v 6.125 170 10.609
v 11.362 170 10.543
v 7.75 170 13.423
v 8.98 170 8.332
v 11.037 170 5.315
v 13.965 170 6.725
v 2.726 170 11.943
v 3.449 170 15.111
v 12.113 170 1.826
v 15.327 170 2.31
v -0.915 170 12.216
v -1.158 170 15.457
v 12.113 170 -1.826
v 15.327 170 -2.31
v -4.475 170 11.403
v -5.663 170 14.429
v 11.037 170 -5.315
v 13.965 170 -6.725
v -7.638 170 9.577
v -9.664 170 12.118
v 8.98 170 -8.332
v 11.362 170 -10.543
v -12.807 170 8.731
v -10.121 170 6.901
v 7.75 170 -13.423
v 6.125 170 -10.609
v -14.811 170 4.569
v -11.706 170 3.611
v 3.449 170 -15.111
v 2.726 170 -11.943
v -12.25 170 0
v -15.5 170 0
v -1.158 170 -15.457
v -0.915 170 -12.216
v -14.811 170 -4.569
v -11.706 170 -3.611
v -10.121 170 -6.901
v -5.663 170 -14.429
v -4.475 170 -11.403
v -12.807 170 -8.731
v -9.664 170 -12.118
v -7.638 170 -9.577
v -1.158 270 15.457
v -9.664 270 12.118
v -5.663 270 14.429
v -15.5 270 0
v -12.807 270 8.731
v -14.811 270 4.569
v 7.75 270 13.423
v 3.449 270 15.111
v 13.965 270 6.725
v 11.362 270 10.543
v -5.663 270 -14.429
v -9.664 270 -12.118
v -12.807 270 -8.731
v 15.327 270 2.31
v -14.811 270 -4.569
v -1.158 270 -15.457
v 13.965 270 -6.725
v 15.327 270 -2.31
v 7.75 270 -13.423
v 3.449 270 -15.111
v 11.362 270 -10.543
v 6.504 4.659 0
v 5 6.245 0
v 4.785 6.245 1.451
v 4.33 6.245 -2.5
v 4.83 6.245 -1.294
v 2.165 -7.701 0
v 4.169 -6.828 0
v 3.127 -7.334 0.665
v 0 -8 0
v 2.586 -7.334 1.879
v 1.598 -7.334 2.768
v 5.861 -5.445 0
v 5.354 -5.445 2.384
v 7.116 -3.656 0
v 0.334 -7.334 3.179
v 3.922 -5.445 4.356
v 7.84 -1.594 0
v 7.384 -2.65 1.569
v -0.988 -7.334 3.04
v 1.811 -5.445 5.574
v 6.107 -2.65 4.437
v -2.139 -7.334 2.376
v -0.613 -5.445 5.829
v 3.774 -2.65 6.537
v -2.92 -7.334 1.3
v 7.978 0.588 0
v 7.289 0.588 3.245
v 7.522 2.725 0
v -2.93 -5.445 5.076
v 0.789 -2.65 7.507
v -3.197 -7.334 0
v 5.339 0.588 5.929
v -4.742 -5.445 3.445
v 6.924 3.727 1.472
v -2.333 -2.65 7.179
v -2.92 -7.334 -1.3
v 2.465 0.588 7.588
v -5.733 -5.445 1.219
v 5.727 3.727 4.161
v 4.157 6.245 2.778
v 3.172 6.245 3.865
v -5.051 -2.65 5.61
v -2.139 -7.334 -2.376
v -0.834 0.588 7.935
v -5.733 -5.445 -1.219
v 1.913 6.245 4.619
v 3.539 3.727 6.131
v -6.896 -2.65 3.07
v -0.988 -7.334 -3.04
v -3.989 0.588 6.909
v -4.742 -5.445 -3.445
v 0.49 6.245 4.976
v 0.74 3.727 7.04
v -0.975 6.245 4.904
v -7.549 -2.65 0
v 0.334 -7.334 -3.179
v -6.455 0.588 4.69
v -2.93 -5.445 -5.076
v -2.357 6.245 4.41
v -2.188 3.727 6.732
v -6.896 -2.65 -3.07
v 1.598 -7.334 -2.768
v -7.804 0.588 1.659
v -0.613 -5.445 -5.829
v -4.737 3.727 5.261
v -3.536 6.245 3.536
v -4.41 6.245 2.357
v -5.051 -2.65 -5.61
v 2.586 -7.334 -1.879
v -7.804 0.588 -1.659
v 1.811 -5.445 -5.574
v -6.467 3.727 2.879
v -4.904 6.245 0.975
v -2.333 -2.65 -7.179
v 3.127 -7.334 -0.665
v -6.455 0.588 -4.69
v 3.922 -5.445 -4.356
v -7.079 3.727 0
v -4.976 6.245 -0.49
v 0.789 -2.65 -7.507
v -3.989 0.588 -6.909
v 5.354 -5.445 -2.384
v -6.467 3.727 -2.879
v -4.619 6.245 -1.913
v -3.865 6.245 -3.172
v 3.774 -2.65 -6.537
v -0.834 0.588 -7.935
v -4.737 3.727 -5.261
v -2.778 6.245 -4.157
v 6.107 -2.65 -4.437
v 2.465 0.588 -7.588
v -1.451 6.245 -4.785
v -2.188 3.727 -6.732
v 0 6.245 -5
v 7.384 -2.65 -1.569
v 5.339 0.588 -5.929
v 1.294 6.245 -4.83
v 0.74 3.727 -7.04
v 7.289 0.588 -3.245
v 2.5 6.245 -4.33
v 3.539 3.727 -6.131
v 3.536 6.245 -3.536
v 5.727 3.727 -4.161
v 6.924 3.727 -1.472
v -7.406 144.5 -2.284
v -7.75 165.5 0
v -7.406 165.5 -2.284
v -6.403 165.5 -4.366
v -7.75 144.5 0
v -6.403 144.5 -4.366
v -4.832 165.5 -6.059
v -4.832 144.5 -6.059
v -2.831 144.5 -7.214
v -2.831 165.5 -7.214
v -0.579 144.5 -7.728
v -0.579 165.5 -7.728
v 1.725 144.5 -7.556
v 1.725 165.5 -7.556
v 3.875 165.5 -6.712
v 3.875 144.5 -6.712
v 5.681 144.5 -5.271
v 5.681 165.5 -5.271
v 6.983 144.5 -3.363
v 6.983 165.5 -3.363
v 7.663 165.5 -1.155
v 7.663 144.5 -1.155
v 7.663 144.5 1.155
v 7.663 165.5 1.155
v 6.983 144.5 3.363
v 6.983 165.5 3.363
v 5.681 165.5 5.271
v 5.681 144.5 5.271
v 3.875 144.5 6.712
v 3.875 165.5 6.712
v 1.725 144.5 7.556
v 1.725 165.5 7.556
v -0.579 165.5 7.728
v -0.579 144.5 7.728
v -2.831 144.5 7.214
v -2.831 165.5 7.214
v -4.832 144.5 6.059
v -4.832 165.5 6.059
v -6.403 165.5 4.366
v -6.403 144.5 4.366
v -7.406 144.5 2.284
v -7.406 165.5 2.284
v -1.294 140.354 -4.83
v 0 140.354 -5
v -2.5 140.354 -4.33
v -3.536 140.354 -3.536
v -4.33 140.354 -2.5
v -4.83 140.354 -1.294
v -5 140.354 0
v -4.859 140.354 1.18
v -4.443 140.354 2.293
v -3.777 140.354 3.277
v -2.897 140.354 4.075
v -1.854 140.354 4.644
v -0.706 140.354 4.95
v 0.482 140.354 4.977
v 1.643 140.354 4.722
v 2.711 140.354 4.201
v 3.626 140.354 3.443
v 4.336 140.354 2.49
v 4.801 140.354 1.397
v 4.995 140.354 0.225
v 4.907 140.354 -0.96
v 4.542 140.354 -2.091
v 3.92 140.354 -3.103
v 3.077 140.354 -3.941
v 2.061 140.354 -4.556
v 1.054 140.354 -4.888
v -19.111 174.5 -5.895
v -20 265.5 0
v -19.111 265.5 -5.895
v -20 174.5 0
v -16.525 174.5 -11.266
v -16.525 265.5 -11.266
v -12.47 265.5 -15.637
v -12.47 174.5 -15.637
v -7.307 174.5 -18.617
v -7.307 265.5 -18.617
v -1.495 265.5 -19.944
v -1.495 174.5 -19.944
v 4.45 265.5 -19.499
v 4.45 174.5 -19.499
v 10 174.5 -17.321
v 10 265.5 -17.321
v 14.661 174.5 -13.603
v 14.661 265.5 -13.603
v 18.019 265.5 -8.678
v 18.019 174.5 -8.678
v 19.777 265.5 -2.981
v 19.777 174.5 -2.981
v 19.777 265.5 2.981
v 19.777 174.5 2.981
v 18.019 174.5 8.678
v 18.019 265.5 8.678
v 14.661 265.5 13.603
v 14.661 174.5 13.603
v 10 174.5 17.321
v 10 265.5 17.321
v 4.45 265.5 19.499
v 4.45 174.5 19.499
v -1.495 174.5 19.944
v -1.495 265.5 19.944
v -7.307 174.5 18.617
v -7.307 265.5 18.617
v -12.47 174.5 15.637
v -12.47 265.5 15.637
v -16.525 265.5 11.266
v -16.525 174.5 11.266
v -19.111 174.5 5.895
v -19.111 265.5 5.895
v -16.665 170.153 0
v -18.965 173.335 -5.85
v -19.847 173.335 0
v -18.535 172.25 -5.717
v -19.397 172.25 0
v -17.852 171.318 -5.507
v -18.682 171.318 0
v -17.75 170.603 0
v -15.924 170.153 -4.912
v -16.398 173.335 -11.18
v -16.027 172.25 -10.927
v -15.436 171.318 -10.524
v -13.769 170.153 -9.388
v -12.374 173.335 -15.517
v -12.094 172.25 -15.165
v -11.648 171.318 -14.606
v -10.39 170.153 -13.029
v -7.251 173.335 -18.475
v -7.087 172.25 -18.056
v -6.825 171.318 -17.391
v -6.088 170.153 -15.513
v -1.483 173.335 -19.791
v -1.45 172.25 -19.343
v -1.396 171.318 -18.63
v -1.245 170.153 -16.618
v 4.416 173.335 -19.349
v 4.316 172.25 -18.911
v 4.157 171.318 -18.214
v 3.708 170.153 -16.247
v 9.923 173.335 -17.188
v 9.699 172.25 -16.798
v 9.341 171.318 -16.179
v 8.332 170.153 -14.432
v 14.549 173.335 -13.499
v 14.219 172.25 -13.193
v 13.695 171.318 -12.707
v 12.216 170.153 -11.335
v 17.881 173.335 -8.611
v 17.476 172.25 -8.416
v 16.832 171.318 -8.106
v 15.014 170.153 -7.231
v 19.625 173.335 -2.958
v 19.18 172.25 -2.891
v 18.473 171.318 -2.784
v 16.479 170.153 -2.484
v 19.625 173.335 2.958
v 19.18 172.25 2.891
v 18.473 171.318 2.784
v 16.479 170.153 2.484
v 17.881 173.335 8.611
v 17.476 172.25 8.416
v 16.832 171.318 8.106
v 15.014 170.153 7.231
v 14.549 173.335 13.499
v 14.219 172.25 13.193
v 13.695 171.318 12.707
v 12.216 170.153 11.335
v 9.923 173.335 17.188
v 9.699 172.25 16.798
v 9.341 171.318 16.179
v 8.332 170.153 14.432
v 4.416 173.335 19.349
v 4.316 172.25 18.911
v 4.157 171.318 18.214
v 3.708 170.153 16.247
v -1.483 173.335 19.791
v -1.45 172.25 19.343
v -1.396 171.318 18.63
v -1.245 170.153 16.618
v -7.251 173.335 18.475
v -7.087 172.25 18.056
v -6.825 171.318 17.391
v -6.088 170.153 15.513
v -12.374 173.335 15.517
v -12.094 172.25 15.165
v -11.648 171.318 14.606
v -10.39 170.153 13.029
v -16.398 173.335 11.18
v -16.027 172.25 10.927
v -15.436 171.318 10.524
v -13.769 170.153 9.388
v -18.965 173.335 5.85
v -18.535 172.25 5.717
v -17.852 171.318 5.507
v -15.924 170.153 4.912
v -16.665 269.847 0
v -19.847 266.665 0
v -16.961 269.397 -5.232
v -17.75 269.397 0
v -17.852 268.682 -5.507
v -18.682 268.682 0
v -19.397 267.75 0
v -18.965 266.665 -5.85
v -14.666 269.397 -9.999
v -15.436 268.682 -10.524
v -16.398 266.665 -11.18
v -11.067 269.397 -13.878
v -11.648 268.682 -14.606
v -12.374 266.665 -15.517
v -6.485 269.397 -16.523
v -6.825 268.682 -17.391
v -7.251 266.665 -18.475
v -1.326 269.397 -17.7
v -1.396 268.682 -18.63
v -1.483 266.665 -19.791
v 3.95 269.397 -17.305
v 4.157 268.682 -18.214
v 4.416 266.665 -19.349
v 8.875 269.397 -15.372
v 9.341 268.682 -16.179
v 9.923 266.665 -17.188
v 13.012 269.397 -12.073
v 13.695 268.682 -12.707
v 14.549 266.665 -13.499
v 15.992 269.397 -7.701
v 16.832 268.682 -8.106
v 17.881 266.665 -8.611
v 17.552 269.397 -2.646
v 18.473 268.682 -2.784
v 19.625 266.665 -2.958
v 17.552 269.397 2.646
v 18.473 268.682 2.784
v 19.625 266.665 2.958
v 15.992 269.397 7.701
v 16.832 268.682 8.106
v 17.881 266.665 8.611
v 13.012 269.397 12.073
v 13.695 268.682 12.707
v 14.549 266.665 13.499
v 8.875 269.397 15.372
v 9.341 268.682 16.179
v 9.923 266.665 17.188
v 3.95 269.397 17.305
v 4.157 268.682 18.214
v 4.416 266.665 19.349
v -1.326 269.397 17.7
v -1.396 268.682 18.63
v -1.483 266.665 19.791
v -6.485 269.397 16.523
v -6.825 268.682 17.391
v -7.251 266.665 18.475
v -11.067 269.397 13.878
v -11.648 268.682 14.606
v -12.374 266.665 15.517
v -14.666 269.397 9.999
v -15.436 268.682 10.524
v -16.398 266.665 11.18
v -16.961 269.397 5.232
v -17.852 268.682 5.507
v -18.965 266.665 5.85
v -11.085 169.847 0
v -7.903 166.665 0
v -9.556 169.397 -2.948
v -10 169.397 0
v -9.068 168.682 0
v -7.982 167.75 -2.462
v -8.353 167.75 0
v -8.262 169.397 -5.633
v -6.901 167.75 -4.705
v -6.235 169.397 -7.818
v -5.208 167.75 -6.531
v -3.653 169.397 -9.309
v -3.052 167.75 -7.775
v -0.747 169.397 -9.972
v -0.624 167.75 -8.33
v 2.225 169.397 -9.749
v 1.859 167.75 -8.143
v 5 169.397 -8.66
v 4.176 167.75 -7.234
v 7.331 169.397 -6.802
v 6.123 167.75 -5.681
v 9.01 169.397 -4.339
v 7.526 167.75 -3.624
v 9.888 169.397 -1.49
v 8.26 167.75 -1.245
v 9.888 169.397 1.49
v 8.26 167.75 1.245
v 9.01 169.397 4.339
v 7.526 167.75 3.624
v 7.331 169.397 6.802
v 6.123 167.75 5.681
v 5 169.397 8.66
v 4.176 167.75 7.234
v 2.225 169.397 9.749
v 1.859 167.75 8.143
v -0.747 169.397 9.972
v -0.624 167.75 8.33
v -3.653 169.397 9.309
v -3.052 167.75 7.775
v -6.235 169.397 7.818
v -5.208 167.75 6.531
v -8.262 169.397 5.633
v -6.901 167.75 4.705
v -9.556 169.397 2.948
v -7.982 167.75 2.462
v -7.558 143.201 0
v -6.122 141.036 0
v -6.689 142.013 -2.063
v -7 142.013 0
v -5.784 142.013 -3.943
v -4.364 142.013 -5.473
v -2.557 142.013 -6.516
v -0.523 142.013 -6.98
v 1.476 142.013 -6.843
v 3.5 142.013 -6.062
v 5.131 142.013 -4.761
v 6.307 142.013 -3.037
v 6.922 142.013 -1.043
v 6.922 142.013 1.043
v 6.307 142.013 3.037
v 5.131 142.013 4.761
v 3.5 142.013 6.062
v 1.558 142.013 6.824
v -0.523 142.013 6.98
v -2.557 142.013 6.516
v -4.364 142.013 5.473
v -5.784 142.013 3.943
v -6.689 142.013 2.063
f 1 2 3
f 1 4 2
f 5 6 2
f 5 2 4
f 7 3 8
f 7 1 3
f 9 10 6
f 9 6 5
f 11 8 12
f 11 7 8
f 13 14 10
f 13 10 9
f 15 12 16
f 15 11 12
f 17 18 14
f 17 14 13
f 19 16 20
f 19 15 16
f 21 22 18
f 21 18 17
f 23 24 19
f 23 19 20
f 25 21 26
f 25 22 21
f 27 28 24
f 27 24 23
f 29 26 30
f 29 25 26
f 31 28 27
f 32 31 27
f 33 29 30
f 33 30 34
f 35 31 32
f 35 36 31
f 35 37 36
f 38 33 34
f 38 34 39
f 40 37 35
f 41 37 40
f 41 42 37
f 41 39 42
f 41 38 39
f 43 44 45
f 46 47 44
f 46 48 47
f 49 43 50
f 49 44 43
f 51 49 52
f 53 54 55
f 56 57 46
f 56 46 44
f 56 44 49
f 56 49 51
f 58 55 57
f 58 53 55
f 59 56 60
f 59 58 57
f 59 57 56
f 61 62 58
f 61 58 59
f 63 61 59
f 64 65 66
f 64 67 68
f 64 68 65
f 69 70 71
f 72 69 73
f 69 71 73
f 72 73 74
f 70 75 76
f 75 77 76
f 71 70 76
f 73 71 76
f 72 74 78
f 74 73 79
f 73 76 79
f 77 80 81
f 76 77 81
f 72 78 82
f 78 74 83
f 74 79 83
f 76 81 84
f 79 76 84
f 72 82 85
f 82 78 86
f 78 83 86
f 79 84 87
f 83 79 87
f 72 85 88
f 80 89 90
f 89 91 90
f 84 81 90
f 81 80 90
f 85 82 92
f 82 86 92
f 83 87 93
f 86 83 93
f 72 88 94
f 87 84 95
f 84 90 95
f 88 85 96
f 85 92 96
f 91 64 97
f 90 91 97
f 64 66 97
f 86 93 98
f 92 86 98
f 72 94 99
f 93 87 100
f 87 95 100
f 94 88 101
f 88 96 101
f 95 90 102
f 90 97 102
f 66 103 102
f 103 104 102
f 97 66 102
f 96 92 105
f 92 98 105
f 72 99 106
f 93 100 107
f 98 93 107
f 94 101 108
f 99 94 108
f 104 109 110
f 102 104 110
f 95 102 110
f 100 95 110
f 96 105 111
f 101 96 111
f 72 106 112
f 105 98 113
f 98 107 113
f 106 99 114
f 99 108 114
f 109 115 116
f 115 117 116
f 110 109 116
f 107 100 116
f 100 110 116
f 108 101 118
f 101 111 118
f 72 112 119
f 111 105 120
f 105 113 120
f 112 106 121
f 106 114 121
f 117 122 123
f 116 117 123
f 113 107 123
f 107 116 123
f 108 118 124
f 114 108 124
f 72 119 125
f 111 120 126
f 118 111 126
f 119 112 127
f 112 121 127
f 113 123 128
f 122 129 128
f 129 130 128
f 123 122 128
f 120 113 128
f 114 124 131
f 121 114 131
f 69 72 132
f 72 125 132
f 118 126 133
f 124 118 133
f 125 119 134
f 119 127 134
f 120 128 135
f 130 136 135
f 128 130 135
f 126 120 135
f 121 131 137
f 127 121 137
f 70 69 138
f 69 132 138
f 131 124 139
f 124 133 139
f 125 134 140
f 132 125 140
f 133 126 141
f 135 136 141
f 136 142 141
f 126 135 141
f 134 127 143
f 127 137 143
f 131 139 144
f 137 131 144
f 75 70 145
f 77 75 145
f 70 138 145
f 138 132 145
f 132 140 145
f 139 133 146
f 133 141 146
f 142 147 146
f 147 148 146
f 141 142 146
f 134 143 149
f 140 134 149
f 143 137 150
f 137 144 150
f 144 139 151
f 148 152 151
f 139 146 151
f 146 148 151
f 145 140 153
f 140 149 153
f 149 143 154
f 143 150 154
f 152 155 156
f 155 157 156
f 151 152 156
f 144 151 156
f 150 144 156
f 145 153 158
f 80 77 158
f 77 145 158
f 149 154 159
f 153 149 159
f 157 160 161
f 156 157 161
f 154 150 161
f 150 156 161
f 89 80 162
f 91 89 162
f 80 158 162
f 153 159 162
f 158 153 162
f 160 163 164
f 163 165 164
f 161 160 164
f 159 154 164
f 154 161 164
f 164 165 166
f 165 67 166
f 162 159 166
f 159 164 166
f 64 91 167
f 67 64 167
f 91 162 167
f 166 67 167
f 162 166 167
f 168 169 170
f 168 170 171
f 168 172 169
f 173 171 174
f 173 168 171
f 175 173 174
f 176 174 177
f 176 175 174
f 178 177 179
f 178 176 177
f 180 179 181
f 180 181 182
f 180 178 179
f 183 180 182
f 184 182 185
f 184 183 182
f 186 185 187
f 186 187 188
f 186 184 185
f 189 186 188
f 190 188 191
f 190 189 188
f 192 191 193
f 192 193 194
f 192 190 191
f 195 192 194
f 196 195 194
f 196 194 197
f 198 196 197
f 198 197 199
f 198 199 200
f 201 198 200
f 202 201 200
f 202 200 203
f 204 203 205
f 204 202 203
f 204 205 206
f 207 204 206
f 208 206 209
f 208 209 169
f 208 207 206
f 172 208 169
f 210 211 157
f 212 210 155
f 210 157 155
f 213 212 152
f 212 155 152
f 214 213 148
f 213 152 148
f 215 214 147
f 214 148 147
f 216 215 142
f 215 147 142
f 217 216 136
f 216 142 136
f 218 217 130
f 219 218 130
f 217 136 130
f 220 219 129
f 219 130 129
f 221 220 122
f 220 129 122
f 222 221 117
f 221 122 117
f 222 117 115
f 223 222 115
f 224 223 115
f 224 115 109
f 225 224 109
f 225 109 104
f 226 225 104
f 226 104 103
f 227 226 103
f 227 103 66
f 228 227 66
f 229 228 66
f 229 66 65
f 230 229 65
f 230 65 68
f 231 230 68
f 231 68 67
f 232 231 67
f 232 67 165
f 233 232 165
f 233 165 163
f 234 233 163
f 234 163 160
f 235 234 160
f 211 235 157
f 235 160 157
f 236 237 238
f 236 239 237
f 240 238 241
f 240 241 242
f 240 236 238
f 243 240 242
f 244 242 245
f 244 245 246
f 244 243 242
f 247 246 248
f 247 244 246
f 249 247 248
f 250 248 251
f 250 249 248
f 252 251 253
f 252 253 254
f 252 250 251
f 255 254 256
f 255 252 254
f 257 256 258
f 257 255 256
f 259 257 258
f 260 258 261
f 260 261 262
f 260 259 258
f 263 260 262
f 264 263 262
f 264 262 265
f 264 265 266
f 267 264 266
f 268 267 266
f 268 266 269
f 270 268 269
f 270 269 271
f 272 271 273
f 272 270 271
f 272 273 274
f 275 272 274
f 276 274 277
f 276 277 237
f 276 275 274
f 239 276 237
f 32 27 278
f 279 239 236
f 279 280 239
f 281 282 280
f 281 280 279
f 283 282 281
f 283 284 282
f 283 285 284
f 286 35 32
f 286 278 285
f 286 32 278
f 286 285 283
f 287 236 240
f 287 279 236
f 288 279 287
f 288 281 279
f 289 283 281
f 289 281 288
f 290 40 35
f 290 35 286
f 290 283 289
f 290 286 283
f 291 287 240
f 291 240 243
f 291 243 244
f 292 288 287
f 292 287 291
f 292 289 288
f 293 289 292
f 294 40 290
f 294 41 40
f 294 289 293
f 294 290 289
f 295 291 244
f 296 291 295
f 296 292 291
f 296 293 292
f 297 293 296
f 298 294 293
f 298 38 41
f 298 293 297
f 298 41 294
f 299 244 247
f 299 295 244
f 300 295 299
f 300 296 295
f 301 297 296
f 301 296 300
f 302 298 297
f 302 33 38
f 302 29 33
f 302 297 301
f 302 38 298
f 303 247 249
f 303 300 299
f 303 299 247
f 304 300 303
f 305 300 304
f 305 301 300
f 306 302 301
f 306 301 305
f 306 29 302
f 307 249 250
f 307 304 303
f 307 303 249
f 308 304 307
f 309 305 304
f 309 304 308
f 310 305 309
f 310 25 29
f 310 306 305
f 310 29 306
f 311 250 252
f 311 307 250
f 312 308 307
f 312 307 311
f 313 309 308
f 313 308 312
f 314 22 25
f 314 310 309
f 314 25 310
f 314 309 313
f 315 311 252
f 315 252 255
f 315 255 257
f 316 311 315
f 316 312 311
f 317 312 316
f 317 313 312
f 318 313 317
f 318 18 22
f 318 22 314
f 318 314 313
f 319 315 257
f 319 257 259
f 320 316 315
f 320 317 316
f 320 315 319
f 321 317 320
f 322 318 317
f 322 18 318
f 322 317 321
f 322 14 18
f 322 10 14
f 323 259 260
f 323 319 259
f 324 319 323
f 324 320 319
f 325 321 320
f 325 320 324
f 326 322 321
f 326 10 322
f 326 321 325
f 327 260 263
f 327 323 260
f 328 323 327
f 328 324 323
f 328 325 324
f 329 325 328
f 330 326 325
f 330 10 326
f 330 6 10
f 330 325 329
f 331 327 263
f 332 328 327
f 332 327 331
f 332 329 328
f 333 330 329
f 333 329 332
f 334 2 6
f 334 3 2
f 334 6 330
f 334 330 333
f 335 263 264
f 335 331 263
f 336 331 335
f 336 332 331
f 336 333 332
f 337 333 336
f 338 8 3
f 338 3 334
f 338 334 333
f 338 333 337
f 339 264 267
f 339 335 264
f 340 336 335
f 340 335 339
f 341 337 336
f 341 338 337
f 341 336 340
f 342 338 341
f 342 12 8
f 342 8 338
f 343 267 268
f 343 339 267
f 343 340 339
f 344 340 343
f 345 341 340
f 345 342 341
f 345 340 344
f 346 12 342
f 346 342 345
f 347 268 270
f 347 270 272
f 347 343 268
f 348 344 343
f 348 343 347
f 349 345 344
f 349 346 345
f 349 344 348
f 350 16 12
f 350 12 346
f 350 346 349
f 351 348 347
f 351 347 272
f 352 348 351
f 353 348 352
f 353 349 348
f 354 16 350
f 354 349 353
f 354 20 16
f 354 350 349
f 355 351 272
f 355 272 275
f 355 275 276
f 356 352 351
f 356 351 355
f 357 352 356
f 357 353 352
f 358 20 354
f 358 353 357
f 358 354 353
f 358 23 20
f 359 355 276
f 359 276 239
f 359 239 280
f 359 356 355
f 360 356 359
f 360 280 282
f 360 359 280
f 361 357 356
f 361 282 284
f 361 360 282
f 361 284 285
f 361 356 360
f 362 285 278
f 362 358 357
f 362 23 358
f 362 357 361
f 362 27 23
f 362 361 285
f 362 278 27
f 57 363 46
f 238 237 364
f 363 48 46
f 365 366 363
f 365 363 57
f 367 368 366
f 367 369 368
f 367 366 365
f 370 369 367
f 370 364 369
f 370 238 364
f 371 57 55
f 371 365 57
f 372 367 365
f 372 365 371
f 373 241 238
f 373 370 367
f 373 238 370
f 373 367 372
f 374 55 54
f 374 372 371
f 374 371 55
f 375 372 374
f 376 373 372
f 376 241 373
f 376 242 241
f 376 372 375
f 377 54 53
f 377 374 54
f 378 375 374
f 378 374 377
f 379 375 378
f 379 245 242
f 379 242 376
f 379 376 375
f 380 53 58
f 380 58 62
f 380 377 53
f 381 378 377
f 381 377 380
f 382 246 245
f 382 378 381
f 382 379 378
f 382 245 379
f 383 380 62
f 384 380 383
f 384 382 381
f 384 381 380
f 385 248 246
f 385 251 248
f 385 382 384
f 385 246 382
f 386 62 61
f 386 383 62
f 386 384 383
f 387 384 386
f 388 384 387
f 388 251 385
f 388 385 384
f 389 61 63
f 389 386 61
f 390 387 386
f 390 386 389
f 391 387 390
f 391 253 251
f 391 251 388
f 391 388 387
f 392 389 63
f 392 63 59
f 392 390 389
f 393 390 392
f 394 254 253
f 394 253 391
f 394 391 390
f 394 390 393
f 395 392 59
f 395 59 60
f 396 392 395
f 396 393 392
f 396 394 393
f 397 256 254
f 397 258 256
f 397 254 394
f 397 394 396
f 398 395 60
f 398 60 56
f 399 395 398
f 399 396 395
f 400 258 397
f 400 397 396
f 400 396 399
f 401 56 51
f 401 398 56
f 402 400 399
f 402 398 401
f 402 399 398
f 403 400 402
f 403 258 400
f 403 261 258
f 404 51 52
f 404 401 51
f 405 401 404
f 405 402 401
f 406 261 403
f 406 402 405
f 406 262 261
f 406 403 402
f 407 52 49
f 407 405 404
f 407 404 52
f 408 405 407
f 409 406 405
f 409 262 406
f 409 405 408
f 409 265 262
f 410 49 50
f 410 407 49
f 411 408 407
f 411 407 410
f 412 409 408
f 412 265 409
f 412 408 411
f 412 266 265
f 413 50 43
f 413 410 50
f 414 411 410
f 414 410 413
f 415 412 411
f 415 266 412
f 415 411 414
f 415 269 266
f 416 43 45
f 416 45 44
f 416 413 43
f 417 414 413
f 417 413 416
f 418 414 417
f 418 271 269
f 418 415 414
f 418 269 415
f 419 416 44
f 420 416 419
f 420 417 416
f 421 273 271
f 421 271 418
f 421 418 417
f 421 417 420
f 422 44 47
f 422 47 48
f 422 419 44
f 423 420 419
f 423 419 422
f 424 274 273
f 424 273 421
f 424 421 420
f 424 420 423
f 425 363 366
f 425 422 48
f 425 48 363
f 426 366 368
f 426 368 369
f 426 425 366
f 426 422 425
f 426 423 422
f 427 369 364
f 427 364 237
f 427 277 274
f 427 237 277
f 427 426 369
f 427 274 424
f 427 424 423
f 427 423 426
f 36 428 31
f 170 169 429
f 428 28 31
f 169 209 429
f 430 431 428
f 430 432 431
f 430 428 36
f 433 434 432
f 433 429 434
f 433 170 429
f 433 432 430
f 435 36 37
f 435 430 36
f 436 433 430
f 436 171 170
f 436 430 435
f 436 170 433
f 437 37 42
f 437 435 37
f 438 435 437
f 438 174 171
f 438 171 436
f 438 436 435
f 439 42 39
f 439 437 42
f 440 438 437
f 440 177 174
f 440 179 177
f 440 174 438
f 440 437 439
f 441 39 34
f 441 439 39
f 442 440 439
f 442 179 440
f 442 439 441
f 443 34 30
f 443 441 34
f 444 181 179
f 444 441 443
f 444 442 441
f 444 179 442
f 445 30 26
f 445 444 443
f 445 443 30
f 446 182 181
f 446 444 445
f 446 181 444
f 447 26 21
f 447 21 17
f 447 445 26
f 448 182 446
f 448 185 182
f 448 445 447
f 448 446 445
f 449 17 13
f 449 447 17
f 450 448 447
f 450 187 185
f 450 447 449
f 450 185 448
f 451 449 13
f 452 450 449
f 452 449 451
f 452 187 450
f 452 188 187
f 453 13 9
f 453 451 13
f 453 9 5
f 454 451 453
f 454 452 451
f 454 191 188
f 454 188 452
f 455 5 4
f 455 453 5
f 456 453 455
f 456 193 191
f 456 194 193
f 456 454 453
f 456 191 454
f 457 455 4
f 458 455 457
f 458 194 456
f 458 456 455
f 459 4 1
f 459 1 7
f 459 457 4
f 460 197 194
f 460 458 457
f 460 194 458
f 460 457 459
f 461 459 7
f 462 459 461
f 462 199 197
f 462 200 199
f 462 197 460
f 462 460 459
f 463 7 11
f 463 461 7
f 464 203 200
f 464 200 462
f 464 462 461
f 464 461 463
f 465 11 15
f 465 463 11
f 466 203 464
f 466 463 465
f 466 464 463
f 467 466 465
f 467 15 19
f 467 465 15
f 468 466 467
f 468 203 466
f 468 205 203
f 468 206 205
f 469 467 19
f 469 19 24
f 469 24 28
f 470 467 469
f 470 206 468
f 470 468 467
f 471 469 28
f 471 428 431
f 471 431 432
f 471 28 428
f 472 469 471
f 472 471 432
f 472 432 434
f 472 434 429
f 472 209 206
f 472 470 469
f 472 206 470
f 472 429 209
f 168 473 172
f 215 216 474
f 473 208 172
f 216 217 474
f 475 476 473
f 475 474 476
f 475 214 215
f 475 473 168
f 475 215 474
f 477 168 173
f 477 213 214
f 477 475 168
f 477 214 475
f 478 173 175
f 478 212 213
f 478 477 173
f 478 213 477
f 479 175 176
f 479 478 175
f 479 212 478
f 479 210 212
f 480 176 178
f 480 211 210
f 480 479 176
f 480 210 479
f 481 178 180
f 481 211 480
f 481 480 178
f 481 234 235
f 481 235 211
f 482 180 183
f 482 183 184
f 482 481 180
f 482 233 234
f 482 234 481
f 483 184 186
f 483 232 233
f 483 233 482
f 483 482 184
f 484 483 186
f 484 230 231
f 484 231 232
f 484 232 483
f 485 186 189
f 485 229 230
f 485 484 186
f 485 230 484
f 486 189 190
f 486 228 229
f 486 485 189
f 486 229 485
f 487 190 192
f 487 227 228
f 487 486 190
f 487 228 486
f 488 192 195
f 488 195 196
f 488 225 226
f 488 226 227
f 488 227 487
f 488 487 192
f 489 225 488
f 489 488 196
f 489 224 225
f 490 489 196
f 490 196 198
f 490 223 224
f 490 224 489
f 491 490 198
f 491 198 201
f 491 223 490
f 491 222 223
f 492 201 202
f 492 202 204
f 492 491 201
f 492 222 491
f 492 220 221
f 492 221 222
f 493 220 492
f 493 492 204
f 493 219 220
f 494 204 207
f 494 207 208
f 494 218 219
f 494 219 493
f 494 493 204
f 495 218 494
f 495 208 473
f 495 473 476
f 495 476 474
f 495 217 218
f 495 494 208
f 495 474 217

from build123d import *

# Parameters (mm, degrees)
SZKIC2_R                    = 5
DODANIE_WYCI_GNI_CIE1_DEPTH = 270


with BuildPart() as part:
    # Szkic1 → Obrót1 (revolve)
    with BuildSketch(Plane.XY):
        with BuildLine():
            Line((0, 8), (0, -8))
            ThreePointArc((0, -8), (8, 0), (0, 8))
        make_face()
    revolve(axis=Axis((0, 8, 0), (0, -1, 0)))

    # Szkic2 → Dodanie-wyciągnięcie1 (add)
    with BuildSketch(Plane(origin=(0, 0, 0), x_dir=(1, 0, 0), z_dir=(0, 1, 0))):
        with Locations(Location((0, 0, 0), (0, 0, 90))):
            Circle(SZKIC2_R)
    extrude(amount=DODANIE_WYCI_GNI_CIE1_DEPTH)

    # Szkic3 → Obrót2 (revolve)
    with BuildSketch(Plane.XY):
        with BuildLine():
            Line((0, 270), (-15.5, 270))
            ThreePointArc((-15.5, 270), (-18.681980515, 268.681980515), (-20, 265.5))
            Line((-20, 265.5), (-20, 174.5))
            ThreePointArc((-20, 174.5), (-18.681980515, 171.318019485), (-15.5, 170))
            Line((-15.5, 170), (-12.25, 170))
            ThreePointArc((-12.25, 170), (-9.068019485, 168.681980515), (-7.75, 165.5))
            Line((-7.75, 165.5), (-7.75, 144.5))
            ThreePointArc((-7.75, 144.5), (-6.431980515, 141.318019485), (-3.25, 140))
            Line((-3.25, 140), (0, 140))
            Line((0, 140), (0, 270))
        make_face()
    revolve(axis=Axis((0, 270, 0), (0, -1, 0)))


solid = part.part
